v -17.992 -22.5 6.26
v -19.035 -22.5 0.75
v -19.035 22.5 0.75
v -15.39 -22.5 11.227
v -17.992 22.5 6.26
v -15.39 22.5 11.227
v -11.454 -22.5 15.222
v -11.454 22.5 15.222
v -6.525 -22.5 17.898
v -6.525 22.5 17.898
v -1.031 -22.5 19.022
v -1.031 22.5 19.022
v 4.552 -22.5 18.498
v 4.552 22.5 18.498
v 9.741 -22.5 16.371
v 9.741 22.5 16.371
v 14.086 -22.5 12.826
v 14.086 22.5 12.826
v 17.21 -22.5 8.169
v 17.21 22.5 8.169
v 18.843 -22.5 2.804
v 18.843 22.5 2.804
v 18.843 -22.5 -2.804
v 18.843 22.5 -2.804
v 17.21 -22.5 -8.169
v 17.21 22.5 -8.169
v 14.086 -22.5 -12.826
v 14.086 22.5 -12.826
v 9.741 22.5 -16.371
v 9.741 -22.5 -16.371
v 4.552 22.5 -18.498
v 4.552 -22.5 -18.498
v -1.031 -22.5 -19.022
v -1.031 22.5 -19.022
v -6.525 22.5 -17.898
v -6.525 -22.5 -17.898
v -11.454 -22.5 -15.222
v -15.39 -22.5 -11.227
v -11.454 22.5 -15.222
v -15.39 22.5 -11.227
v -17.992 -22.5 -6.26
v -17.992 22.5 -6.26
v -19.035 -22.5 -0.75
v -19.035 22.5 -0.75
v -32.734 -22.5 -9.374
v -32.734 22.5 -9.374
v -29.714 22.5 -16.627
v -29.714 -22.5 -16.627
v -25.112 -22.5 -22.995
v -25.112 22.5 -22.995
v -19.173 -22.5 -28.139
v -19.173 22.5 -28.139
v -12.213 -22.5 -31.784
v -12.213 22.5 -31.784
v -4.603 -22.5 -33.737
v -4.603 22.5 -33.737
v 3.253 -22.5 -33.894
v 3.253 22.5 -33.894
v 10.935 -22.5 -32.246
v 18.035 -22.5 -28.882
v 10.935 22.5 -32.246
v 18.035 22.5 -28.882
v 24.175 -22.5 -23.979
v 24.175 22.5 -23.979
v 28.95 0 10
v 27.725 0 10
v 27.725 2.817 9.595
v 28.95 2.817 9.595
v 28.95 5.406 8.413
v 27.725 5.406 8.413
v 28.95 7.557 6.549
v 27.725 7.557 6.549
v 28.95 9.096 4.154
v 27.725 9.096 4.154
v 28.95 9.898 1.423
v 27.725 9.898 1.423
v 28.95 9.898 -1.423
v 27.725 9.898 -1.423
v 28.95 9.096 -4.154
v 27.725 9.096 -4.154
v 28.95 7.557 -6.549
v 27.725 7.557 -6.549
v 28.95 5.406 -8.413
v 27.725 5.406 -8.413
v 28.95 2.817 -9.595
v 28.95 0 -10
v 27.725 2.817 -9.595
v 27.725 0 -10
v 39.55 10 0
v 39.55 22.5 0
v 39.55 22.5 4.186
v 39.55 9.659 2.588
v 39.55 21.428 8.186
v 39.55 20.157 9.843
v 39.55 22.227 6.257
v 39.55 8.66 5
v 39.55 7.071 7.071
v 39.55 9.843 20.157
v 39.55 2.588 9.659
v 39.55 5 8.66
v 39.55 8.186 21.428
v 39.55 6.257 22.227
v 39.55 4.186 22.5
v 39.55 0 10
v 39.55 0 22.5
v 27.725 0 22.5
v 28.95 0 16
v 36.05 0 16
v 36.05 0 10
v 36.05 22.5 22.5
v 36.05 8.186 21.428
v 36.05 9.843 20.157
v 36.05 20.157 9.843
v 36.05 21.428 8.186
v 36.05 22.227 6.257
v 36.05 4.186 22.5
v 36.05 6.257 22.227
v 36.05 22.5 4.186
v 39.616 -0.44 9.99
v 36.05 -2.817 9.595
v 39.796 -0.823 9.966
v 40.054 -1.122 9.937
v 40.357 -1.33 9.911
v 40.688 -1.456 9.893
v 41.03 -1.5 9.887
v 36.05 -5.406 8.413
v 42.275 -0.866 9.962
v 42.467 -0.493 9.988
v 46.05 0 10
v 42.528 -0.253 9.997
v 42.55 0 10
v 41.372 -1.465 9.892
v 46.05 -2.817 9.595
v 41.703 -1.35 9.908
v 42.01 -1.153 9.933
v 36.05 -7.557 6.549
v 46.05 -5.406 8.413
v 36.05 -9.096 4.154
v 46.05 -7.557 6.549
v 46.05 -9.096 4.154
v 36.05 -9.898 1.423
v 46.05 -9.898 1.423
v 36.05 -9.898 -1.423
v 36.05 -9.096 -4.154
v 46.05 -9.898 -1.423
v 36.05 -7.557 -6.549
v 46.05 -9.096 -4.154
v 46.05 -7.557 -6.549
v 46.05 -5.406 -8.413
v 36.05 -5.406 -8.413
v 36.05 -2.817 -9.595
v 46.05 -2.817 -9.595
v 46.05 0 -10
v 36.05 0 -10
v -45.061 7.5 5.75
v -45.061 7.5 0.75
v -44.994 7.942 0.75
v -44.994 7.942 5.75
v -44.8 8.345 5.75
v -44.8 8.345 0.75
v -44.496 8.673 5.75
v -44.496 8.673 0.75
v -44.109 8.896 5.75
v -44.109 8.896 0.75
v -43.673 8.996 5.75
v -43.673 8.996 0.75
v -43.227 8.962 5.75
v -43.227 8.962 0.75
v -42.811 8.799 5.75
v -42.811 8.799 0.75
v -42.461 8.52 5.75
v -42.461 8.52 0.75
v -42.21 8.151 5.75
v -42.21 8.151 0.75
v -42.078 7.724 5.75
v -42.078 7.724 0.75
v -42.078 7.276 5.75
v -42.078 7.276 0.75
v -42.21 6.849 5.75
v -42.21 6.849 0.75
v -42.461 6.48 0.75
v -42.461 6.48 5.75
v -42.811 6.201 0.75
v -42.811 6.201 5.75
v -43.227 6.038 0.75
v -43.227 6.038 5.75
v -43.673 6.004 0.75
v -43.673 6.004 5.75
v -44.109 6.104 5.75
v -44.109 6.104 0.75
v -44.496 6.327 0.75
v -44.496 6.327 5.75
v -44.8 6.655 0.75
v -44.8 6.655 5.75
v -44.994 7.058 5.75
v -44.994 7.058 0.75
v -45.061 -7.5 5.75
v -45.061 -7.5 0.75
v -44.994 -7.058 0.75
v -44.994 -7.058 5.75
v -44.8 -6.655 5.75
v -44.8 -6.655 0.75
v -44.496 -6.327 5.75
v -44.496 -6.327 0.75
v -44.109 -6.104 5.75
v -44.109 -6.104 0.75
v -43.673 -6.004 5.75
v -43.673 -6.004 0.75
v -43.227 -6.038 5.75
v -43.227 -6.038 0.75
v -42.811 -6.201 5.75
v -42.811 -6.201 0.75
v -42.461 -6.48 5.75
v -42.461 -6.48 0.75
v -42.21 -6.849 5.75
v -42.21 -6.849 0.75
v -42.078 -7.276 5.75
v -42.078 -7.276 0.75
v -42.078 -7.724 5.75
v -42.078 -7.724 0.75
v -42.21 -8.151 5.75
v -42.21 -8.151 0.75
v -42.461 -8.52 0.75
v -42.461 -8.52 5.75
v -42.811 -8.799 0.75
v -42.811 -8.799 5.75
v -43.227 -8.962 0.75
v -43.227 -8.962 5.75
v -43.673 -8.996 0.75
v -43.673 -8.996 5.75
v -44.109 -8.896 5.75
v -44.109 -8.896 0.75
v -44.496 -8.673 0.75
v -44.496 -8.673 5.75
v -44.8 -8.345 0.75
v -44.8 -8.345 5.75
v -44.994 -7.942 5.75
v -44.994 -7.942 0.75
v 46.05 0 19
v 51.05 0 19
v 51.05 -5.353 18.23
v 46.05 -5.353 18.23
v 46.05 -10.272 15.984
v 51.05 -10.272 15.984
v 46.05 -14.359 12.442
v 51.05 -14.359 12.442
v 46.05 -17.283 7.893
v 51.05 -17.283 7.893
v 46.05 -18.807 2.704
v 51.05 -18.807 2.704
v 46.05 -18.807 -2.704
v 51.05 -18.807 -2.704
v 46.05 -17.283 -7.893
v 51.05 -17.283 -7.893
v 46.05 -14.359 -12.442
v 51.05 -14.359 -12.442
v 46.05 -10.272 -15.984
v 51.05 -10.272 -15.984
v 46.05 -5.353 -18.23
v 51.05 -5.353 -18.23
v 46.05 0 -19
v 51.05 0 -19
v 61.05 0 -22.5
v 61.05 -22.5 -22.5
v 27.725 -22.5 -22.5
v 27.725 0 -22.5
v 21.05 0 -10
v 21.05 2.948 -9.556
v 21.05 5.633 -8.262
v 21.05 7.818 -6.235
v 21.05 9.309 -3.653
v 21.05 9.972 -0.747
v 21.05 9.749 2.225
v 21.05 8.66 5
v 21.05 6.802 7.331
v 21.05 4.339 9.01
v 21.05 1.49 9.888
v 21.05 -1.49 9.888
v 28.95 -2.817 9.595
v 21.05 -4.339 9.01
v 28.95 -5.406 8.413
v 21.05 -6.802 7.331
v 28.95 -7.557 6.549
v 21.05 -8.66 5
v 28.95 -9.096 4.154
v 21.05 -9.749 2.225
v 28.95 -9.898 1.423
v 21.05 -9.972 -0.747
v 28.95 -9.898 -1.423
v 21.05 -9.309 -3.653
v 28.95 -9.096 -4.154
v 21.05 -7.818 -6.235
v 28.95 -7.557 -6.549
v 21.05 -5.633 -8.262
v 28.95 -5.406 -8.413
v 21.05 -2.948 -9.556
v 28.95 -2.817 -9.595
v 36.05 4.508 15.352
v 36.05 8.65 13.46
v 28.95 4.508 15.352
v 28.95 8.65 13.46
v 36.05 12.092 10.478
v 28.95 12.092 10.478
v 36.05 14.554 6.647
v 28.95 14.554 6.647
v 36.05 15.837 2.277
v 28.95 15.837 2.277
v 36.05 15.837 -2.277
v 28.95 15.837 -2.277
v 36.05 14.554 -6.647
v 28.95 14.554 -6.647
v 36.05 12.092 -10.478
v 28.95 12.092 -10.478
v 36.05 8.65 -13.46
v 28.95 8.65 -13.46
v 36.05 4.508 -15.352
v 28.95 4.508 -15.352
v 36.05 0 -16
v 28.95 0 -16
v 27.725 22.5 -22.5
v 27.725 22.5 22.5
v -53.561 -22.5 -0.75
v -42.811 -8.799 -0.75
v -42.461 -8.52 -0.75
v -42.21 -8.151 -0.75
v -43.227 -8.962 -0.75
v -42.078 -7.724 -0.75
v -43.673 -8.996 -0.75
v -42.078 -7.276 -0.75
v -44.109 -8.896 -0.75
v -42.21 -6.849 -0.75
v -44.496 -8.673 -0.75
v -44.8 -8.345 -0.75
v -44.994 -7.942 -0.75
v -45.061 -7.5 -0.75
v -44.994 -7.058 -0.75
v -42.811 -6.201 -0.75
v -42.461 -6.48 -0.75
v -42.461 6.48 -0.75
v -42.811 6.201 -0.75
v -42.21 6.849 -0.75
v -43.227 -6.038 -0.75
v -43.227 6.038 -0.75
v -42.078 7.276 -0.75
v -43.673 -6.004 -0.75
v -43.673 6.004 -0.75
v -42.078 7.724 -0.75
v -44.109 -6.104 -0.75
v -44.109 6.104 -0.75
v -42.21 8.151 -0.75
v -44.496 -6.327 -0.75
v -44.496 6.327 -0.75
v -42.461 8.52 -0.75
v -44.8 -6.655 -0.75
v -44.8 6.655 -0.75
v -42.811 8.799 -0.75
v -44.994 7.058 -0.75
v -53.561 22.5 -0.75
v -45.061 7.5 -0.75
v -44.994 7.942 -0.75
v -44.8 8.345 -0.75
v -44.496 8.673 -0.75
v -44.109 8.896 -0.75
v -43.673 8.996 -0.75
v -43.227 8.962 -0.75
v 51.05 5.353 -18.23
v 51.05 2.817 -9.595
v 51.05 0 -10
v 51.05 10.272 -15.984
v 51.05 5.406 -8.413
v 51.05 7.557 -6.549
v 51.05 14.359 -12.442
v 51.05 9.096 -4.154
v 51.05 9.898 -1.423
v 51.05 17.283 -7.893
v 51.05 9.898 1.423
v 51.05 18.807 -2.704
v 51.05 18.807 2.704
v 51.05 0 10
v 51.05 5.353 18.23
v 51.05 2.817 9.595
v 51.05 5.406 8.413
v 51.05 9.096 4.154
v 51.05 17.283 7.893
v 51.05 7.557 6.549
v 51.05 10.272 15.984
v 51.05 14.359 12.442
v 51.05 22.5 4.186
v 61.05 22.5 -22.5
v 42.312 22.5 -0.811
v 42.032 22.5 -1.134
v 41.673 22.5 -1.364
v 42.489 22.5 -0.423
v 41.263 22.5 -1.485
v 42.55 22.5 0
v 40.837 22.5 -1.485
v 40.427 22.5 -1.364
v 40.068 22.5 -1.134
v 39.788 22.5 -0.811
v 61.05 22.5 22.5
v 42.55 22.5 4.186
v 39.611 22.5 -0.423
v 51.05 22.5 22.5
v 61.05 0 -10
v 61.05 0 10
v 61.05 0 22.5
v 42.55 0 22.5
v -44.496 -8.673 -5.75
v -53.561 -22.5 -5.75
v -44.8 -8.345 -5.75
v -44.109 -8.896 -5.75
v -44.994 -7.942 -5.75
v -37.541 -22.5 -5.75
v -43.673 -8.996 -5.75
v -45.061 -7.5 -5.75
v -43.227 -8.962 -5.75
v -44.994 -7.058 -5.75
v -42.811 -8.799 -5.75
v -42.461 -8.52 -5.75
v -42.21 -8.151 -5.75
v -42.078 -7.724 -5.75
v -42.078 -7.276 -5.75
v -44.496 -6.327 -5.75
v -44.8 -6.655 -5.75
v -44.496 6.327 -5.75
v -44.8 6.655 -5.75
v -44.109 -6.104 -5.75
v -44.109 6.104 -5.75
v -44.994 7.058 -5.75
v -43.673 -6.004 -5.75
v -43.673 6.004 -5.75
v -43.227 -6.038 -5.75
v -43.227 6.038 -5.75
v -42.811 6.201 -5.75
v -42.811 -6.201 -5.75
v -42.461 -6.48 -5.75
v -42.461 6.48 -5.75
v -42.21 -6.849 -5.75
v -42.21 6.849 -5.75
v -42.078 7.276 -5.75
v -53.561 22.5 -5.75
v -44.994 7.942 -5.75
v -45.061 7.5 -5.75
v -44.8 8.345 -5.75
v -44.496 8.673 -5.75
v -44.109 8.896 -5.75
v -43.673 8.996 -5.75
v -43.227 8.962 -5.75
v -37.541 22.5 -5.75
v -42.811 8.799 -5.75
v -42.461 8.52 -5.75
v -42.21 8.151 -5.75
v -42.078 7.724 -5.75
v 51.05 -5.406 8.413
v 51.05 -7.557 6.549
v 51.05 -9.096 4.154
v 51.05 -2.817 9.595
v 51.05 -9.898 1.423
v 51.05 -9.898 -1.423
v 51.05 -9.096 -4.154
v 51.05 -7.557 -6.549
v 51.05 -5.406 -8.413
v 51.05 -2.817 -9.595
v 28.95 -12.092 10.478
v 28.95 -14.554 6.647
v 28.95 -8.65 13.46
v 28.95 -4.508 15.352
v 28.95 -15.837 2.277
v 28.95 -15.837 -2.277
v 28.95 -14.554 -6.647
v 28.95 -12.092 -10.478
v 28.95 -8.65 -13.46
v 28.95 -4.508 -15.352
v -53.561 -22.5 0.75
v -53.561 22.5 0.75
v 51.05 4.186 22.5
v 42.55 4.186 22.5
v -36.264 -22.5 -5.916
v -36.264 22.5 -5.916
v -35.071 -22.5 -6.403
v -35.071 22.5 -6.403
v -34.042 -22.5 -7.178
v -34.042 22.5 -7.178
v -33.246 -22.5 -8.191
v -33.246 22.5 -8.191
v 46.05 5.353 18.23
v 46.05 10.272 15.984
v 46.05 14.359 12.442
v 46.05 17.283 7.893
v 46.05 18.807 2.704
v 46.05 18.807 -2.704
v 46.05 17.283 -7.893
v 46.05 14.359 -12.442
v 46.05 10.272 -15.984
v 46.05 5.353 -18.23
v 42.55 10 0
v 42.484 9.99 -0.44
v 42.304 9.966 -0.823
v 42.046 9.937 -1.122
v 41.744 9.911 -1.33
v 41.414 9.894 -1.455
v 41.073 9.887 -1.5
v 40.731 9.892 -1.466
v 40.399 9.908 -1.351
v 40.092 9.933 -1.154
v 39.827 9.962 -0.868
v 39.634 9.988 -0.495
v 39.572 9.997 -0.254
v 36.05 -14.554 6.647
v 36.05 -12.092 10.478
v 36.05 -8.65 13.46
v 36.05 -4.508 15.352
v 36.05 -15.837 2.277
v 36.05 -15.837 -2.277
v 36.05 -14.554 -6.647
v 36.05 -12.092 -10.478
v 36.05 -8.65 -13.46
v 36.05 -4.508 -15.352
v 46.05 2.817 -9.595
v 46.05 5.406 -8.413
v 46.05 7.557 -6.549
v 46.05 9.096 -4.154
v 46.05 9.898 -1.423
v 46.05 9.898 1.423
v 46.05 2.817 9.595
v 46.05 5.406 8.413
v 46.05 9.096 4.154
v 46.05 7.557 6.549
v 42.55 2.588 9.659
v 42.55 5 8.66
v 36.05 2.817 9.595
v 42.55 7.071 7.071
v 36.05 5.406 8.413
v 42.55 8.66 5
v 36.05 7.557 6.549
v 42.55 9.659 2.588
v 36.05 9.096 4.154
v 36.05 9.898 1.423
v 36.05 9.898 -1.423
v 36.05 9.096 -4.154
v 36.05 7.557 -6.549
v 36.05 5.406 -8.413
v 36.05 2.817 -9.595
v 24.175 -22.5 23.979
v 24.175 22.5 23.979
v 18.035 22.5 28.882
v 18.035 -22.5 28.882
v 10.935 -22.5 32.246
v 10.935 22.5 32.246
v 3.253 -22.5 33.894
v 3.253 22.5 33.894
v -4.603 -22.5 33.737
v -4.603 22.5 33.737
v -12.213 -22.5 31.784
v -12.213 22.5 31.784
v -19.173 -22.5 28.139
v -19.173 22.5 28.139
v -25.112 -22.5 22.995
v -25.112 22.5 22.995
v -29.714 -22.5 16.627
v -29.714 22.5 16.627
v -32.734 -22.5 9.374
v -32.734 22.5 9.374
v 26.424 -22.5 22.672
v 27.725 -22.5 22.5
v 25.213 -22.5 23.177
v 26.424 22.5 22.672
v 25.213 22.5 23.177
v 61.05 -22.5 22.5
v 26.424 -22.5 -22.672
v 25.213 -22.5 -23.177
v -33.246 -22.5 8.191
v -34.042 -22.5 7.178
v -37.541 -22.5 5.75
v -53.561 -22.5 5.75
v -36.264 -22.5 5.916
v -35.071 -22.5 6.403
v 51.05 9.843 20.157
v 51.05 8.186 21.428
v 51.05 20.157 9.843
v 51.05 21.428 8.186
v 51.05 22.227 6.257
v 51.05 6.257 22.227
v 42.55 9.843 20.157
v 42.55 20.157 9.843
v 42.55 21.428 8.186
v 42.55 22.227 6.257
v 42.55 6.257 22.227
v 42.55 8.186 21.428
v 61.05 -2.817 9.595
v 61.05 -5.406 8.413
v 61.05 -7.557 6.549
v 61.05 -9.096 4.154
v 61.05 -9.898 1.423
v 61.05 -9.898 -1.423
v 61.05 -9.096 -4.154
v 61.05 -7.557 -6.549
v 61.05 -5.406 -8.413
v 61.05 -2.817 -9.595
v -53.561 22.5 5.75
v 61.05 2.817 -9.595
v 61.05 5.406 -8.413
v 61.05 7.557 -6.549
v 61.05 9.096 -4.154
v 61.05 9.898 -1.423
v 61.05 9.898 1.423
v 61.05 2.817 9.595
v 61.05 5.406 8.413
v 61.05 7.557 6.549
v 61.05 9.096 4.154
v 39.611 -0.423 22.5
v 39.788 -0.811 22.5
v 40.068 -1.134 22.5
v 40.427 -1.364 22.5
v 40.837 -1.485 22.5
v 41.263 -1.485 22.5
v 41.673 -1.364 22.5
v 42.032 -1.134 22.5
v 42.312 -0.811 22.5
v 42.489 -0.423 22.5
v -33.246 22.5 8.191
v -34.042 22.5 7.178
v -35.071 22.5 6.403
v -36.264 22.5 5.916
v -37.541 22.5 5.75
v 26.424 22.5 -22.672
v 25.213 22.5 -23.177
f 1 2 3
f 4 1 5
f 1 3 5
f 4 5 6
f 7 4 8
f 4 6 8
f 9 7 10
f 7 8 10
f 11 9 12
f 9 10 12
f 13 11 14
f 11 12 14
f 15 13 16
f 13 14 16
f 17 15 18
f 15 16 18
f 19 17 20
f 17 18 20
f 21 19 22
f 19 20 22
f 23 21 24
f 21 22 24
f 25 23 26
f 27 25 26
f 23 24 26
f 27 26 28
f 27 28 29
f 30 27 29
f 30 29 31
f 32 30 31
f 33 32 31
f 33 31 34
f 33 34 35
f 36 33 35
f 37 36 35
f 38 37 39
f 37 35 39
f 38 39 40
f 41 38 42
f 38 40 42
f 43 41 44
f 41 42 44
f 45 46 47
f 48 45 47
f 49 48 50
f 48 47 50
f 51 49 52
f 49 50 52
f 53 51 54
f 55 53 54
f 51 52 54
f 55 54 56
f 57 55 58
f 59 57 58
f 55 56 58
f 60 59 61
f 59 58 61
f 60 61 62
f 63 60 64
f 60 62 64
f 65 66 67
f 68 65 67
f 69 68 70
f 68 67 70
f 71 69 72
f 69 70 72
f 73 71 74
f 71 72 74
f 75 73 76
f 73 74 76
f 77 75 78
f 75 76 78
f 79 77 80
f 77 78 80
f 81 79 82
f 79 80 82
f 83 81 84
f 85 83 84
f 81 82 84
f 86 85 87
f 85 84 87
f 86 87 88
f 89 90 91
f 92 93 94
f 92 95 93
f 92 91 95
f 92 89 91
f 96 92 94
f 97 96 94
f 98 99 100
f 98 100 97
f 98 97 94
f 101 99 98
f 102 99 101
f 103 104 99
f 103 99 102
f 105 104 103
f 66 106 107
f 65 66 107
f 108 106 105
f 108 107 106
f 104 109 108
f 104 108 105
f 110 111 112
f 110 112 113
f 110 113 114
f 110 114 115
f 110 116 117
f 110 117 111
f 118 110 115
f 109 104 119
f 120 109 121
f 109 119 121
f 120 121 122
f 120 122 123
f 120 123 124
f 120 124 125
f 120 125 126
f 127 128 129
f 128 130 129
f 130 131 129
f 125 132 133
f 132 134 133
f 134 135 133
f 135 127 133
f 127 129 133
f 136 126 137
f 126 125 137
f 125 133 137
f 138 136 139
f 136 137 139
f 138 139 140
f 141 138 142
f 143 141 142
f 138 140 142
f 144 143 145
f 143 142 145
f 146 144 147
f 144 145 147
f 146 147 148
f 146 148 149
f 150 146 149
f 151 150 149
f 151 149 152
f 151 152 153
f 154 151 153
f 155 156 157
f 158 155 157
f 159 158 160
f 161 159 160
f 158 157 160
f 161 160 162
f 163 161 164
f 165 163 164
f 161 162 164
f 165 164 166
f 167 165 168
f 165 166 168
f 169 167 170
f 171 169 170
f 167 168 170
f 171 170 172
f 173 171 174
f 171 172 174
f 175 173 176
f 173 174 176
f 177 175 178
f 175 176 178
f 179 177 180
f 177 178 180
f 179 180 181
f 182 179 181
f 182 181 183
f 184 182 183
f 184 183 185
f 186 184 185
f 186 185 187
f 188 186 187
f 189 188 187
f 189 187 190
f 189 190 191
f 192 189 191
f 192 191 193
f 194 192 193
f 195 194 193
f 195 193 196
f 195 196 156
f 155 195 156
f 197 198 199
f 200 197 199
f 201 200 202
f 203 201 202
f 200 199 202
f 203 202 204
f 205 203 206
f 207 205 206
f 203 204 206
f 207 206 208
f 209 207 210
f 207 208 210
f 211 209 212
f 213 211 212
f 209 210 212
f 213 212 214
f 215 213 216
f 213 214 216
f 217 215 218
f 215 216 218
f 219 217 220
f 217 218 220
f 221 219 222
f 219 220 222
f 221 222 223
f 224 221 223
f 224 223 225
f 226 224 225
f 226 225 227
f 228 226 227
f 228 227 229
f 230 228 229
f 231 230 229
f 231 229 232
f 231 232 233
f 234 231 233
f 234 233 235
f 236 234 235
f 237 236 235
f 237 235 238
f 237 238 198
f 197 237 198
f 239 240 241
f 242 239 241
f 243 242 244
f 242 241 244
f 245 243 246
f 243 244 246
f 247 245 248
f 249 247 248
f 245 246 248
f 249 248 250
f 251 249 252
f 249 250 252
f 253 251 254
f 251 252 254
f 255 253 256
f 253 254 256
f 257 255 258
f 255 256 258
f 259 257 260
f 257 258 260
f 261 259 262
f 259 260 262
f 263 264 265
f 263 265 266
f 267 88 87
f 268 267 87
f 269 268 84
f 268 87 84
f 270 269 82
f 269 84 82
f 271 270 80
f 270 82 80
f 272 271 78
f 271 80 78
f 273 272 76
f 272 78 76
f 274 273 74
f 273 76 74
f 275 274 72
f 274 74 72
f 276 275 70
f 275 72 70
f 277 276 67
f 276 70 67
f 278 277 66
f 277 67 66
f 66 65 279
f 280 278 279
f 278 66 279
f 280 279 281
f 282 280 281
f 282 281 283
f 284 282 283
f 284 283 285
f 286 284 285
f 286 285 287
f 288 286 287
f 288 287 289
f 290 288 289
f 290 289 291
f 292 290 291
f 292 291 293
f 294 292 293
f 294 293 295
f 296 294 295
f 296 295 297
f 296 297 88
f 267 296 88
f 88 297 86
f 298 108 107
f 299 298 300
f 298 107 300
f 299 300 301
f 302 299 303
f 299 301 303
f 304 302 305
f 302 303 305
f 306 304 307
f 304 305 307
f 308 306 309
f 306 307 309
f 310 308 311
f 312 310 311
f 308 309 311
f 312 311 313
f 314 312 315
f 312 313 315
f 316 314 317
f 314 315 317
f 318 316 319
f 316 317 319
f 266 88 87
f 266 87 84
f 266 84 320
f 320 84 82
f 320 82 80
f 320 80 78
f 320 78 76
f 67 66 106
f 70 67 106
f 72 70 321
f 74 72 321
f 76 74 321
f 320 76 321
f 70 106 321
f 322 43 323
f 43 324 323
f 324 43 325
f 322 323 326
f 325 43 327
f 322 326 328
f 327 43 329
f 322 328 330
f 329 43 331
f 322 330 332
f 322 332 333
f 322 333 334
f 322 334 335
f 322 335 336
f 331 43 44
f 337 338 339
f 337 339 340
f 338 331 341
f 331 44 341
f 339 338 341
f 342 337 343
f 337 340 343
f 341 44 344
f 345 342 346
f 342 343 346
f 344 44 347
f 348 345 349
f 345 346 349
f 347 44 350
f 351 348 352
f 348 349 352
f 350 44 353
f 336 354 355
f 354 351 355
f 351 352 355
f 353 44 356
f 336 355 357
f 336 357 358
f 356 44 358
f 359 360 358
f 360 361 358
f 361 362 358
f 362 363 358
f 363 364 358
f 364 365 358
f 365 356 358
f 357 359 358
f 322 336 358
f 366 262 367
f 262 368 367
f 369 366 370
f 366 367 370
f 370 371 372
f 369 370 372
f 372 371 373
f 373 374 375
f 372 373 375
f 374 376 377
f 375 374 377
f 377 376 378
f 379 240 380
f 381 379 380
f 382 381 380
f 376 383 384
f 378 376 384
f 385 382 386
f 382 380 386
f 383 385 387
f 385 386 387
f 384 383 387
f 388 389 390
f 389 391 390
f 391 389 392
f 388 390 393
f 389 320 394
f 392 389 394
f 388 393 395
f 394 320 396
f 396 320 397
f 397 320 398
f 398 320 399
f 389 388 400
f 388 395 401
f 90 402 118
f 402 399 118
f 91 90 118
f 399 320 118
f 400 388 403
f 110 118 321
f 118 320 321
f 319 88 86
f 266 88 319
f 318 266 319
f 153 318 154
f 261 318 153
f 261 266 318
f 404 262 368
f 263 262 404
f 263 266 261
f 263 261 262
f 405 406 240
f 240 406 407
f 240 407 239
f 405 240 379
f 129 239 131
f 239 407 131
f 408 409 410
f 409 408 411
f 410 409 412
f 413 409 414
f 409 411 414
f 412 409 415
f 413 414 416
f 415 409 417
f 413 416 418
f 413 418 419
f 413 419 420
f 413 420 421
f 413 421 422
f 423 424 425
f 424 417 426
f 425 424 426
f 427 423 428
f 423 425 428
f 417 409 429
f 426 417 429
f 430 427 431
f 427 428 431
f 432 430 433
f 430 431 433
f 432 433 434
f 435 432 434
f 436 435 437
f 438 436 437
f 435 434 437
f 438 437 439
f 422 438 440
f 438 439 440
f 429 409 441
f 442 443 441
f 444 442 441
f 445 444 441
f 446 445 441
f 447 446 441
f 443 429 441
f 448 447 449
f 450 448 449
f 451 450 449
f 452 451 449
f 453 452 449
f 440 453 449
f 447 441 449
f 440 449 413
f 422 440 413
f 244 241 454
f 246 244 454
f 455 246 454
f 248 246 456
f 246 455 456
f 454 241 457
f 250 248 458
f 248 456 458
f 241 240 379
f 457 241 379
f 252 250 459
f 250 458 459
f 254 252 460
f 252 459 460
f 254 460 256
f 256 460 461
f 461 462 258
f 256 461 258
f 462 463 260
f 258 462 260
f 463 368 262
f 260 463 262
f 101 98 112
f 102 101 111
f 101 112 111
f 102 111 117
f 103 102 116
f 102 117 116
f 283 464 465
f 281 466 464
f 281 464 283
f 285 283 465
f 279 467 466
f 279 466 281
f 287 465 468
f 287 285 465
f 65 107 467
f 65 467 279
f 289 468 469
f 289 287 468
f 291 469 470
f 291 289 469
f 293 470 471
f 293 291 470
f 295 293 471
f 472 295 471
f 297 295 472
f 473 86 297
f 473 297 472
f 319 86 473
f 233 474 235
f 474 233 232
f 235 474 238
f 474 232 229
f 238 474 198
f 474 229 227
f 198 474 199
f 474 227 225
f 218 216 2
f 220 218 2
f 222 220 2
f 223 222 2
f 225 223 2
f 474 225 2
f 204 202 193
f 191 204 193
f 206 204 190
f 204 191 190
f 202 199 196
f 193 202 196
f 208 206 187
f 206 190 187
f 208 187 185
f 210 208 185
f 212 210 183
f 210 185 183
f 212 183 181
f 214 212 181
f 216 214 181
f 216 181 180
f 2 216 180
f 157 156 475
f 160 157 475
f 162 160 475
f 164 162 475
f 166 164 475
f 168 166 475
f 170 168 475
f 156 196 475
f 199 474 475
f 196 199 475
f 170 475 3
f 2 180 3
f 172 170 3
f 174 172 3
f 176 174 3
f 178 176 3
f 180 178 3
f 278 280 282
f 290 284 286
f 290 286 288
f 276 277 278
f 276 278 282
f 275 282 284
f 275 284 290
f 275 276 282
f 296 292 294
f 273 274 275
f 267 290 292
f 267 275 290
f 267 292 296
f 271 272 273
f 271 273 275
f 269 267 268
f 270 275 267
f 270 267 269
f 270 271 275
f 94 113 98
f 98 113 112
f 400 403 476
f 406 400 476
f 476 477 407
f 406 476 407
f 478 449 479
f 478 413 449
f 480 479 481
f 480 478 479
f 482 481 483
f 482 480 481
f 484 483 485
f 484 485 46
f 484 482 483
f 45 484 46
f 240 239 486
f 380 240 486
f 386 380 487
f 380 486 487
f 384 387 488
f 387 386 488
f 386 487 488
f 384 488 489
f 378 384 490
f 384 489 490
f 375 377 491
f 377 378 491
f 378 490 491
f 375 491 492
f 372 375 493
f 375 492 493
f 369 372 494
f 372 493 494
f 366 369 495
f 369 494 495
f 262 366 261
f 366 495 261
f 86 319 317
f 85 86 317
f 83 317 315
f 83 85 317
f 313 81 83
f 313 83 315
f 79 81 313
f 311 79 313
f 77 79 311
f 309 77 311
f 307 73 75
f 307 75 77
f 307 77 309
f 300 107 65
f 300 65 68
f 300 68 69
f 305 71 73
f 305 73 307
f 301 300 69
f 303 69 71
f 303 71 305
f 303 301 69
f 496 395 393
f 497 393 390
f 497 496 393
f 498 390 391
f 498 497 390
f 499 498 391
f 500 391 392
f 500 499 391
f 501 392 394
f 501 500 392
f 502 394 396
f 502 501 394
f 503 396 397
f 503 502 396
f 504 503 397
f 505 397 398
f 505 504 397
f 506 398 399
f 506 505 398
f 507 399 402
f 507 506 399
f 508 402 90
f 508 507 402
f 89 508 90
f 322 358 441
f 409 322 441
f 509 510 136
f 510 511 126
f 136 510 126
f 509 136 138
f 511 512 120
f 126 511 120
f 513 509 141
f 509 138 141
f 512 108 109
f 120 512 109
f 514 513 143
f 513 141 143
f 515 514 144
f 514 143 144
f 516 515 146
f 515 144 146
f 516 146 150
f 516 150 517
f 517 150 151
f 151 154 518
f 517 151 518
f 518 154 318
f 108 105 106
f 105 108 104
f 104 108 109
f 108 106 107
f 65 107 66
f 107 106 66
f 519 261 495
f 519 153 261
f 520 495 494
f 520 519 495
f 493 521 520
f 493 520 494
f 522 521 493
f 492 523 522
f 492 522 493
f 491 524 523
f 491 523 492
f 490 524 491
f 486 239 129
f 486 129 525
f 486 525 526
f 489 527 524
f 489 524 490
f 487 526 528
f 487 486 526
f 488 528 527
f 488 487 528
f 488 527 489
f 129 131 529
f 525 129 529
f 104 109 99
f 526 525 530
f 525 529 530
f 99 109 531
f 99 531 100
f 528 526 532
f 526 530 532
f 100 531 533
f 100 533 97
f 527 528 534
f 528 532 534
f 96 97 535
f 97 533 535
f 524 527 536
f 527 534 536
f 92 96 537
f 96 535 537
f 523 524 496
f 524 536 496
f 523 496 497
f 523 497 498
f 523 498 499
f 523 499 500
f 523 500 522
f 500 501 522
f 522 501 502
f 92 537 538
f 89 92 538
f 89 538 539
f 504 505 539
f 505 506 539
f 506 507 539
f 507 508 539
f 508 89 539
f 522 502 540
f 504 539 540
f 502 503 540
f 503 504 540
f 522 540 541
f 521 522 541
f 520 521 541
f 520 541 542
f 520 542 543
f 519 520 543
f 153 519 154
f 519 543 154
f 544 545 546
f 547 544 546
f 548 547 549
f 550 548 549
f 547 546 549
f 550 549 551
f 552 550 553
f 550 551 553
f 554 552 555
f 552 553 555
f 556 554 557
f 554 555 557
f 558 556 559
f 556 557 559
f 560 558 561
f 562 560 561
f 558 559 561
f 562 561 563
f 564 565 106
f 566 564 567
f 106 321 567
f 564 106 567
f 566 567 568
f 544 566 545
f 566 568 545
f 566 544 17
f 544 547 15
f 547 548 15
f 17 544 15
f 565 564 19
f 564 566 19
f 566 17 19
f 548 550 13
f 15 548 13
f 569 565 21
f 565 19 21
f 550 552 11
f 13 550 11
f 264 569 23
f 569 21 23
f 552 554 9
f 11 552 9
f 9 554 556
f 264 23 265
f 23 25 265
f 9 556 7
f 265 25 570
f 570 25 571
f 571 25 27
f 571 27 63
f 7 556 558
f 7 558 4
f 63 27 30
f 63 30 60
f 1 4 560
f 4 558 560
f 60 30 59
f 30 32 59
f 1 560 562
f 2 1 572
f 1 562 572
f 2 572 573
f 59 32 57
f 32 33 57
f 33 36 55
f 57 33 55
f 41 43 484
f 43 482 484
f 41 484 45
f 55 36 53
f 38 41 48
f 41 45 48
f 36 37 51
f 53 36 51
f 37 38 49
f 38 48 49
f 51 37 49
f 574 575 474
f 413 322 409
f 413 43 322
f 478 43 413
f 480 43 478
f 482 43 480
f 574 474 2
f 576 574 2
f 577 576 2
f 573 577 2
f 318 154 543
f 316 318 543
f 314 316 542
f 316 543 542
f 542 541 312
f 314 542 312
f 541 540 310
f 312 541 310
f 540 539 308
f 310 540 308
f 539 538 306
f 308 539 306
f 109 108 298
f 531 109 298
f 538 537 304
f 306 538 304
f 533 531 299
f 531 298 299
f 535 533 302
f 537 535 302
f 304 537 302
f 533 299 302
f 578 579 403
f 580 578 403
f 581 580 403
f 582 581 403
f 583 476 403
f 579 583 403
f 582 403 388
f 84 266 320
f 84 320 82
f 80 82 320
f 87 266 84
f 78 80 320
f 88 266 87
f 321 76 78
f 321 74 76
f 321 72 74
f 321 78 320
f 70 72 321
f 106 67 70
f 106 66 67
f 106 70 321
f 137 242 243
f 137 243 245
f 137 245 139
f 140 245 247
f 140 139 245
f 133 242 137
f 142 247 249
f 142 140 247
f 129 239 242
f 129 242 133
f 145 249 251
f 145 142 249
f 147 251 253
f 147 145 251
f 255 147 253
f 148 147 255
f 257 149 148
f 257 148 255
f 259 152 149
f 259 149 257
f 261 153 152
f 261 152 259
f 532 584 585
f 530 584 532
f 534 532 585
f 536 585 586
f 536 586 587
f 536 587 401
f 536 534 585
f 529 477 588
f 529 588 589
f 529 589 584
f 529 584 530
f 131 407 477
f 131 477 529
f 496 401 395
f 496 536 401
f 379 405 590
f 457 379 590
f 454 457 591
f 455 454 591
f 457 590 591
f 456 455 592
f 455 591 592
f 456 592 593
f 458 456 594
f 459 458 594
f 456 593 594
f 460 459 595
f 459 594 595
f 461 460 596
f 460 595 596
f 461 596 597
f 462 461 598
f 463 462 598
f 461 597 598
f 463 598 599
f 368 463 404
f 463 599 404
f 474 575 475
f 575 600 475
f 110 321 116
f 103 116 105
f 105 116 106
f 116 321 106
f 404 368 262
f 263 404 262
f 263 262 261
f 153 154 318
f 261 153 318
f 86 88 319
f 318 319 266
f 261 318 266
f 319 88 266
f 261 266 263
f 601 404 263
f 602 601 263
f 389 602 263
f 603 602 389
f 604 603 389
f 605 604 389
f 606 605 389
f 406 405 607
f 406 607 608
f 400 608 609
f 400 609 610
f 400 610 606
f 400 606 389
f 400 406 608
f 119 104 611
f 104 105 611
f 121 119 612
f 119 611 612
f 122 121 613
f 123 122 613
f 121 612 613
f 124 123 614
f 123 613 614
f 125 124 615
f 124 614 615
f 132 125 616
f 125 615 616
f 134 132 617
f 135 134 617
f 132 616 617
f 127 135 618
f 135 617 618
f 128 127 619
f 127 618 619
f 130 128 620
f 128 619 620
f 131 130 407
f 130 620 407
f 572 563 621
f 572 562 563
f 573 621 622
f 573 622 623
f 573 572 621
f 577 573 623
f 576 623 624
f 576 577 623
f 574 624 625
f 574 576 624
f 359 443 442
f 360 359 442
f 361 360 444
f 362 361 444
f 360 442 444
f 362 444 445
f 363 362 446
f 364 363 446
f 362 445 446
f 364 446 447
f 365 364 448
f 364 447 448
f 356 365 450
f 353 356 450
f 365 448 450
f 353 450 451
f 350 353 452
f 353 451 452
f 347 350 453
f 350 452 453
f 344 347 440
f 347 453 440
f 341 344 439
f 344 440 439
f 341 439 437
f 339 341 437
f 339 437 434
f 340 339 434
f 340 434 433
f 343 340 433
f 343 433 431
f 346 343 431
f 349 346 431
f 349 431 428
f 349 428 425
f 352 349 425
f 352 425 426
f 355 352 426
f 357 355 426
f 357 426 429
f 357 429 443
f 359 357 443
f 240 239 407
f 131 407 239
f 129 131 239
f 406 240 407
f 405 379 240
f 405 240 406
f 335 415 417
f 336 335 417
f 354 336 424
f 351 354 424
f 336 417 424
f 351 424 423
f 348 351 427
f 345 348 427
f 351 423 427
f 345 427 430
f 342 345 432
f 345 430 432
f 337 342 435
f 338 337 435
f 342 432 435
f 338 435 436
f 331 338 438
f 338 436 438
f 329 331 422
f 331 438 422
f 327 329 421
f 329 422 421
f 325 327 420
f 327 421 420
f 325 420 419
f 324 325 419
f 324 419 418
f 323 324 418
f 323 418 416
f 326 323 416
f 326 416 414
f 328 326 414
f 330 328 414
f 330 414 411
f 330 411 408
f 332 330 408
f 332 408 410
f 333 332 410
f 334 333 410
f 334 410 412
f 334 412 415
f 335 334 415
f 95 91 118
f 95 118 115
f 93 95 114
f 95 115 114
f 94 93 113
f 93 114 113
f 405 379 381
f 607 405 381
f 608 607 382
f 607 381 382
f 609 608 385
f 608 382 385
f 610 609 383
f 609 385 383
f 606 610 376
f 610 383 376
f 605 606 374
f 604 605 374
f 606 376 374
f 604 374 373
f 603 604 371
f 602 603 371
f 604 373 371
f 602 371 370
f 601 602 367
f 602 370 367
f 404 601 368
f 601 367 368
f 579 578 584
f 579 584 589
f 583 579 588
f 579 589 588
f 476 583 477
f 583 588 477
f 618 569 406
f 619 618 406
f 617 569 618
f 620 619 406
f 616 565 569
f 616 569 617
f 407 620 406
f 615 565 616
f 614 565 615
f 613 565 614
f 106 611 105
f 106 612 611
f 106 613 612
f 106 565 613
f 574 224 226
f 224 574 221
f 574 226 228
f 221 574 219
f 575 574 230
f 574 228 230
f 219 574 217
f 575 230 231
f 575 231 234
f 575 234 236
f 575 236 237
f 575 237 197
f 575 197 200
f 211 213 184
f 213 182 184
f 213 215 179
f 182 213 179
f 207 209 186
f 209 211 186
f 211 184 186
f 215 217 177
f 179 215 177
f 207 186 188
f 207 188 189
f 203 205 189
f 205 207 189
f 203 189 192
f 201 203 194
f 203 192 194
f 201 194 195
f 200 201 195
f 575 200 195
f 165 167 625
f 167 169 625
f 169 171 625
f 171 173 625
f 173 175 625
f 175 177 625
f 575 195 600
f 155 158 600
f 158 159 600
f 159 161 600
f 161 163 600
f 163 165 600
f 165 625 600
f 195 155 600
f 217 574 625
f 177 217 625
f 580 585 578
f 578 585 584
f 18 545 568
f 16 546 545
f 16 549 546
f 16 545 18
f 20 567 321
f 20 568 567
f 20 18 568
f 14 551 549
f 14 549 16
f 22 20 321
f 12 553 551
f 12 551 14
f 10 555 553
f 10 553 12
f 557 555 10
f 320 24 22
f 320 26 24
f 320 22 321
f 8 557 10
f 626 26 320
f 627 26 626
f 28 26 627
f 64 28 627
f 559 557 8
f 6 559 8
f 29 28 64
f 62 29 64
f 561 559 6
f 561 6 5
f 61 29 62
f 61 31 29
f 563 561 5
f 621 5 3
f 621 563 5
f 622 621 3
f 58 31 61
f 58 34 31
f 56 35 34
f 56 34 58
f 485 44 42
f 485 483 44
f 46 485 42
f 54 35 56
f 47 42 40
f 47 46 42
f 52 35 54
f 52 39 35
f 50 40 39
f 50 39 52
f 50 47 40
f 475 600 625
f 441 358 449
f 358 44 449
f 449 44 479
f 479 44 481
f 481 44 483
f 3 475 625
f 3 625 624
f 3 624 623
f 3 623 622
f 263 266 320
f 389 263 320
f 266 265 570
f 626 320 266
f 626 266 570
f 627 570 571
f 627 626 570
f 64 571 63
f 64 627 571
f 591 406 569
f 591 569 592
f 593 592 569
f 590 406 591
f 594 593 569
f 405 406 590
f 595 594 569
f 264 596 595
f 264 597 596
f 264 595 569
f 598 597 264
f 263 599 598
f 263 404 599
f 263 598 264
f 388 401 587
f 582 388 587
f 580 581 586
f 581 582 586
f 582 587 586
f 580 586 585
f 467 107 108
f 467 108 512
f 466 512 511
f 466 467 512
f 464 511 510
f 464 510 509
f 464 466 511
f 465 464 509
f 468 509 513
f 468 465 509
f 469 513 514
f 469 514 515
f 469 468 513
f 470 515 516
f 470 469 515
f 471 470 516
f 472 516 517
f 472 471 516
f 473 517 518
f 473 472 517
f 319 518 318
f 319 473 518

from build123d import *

# Parameters (mm, degrees)
BOSS_EXTRUDE1_DEPTH     = 22.5
F_3_0MM_DOWEL_HOLE1_D   = 3
BOSS_EXTRUDE2_START     = -8.493151603
BOSS_EXTRUDE2_OUTLINE_W = 45
BOSS_EXTRUDE2_OUTLINE_H = 45
BOSS_EXTRUDE2_DEPTH     = 35.493151603
SKETCH5_R               = 10
CUT_EXTRUDE1_DEPTH      = 40
CUT_EXTRUDE9_START      = -10
SKETCH16_R              = 19
CUT_EXTRUDE9_DEPTH      = 5
CUT_EXTRUDE2_START      = 22.5
SKETCH7_W               = 7.1
SKETCH7_H               = 45
CUT_EXTRUDE2_DEPTH      = 40
SKETCH8_W               = 22.5
SKETCH8_H               = 22.5
CUT_EXTRUDE3_DEPTH      = 1.5
CUT_EXTRUDE5_OUTLINE_W  = 1.5
CUT_EXTRUDE5_OUTLINE_H  = 12.613186919
CUT_EXTRUDE8_START      = 9
CUT_EXTRUDE8_DEPTH      = 14
CHAMFER1_START          = 36.05
CHAMFER1_DEPTH          = 15
FILLET3_R               = 5
FILLET4_R               = 8
SKETCH23_W              = 45
SKETCH23_H              = 40
SKETCH23_R              = 16
BOSS_EXTRUDE5_DEPTH     = 7.1
SPLIT1_START            = 27.724582954
SPLIT1_DEPTH            = 33.325417046
SPLIT1_START_2          = 51.05
SPLIT1_2_DEPTH          = 10
SPLIT1_START_3          = 36.05
SPLIT1_3_DEPTH          = 10
SPLIT1_4_DEPTH          = 8.325417046
SPLIT1_5_DEPTH          = 1.225417046
SPLIT1_START_4          = -1
SPLIT1_6_DEPTH          = 24
SPLIT1_7_DEPTH          = 22.5


with BuildPart() as part:
    # Sketch3 → Boss-Extrude1 (new, symmetric)
    with BuildSketch(Plane(origin=(0, 0, 0), x_dir=(1, 0, 0), z_dir=(0, 1, 0))):
        with BuildLine():
            Line((-53.560989258, 0.75), (-53.560989258, 5.75))
            Line((-53.560989258, 5.75), (-33.560989258, 5.75))
            ThreePointArc((-33.560989258, 5.75), (34.05, 0), (-33.560989258, -5.75))
            Line((-33.560989258, -5.75), (-53.560989258, -5.75))
            Line((-53.560989258, -5.75), (-53.560989258, -0.75))
            Line((-53.560989258, -0.75), (-19.035230495, -0.75))
            ThreePointArc((-19.035230495, -0.75), (19.05, 0), (-19.035230495, 0.75))
            Line((-19.035230495, 0.75), (-53.560989258, 0.75))
        make_face()
    extrude(amount=BOSS_EXTRUDE1_DEPTH, both=True)

    # Ø3.0mm Dowel Hole1 (through all)
    with Locations(Plane.XY.offset(5.75)):
        with Locations((-43.560989258, 7.5), (-43.560989258, -7.5)):
            Hole(F_3_0MM_DOWEL_HOLE1_D / 2)

    # Boss-Extrude2: read off the stored shape, not the designer's step
    # Boss-Extrude2 outline → Boss-Extrude2 (add)
    with BuildSketch(Plane(origin=(34.05, 0, 0), x_dir=(0, 0, -1), z_dir=(1, 0, 0)).offset(BOSS_EXTRUDE2_START)):
        Rectangle(BOSS_EXTRUDE2_OUTLINE_W, BOSS_EXTRUDE2_OUTLINE_H)
    extrude(amount=BOSS_EXTRUDE2_DEPTH)

    # Sketch5 → Cut-Extrude1 (cut)
    with BuildSketch(Plane(origin=(61.05, 0, 0), x_dir=(0, 0, -1), z_dir=(1, 0, 0))):
        Circle(SKETCH5_R)
    extrude(amount=-CUT_EXTRUDE1_DEPTH, mode=Mode.SUBTRACT)

    # Sketch16 → Cut-Extrude9 (cut)
    with BuildSketch(Plane(origin=(61.05, 0, 0), x_dir=(0, 0, -1), z_dir=(1, 0, 0)).offset(CUT_EXTRUDE9_START)):
        Circle(SKETCH16_R)
    extrude(amount=-CUT_EXTRUDE9_DEPTH, mode=Mode.SUBTRACT)

    # Sketch7 → Cut-Extrude2 (cut)
    with BuildSketch(Plane(origin=(0, 0, 0), x_dir=(1, 0, 0), z_dir=(0, 1, 0)).offset(CUT_EXTRUDE2_START)):
        with Locations((32.5, 0)):
            Rectangle(SKETCH7_W, SKETCH7_H)
    extrude(amount=-CUT_EXTRUDE2_DEPTH, mode=Mode.SUBTRACT)

    # Sketch8 → Cut-Extrude3 (cut, symmetric)
    with BuildSketch(Plane.ZY.offset(-41.05)):
        with Locations((11.25, 11.25)):
            Rectangle(SKETCH8_W, SKETCH8_H)
    extrude(amount=CUT_EXTRUDE3_DEPTH, both=True, mode=Mode.SUBTRACT)

    # Cut-Extrude5: read off the stored shape, not the designer's step
    # Cut-Extrude5 outline → Cut-Extrude5 (revolve, cut)
    with BuildSketch(Plane(origin=(41.05, 0, 0), x_dir=(1, 0, 0), z_dir=(0, -1, 0))):
        with Locations((0.75, 16.19340654)):
            Rectangle(CUT_EXTRUDE5_OUTLINE_W, CUT_EXTRUDE5_OUTLINE_H)
    revolve(axis=Axis((41.05, 0, 0), (0, 0, 1)), mode=Mode.SUBTRACT)

    # Cut-Extrude8: read off the stored shape, not the designer's step
    # Cut-Extrude8 outline → Cut-Extrude8 (cut)
    with BuildSketch(Plane(origin=(0, 0, 0), x_dir=(1, 0, 0), z_dir=(0, 1, 0)).offset(CUT_EXTRUDE8_START)):
        with BuildLine():
            ThreePointArc((42.55, 0), (41.05, 1.5), (39.55, 0))
            Line((39.55, 0), (42.55, 0))
        make_face()
    extrude(amount=CUT_EXTRUDE8_DEPTH, mode=Mode.SUBTRACT)

    # Chamfer1: read off the stored shape, not the designer's step
    # Chamfer1 outline → Chamfer1 (cut)
    with BuildSketch(Plane.YZ.offset(CHAMFER1_START)):
        Polygon((22.5, 22.5), (7.5, 22.5), (22.5, 7.5), align=None)
    extrude(amount=CHAMFER1_DEPTH, mode=Mode.SUBTRACT)

    # Fillet3
    fillet3_edges = [part.edges().sort_by_distance(p)[0] for p in [
        (-33.560989258, 0, -5.75),
        (-33.560989258, 0, 5.75),
        (25.556848397, 0, -22.5),
        (25.556848397, 0, 22.5),
    ]]
    fillet(fillet3_edges, radius=FILLET3_R)

    # Fillet4
    fillet4_edges = [part.edges().sort_by_distance(p)[0] for p in [
        (37.8, 22.5, 7.5),
        (46.8, 22.5, 7.5),
        (37.8, 7.5, 22.5),
        (46.8, 7.5, 22.5),
    ]]
    fillet(fillet4_edges, radius=FILLET4_R)

    # Sketch23 → Boss-Extrude5 (add)
    with BuildSketch(Plane(origin=(28.95, 0, 0), x_dir=(0, 0, -1), z_dir=(1, 0, 0))):
        with Locations((0, 2.5)):
            Rectangle(SKETCH23_W, SKETCH23_H)
        with Locations(Location((0, 0, 0), (0, 0, 180))):
            Circle(SKETCH23_R, mode=Mode.SUBTRACT)
    extrude(amount=BOSS_EXTRUDE5_DEPTH)

    # Split1 7 outline → Split1 7 (cut)
    with BuildSketch(Plane(origin=(0, 0, 0), x_dir=(1, 0, 0), z_dir=(0, 1, 0))):
        with BuildLine():
            Line((61.05, 22.5), (27.724582954, 22.5))
            Line((27.724582954, 22.5), (27.724582954, -22.5))
            Line((27.724582954, -22.5), (36.05, -22.5))
            Line((36.05, -22.5), (39.55, -22.5))
            Line((39.55, -22.5), (39.55, 0))
            ThreePointArc((39.55, 0), (41.05, 1.5), (42.55, 0))
            Line((42.55, 0), (42.55, -22.5))
            Line((42.55, -22.5), (51.05, -22.5))
            Line((51.05, -22.5), (61.05, -22.5))
            Line((61.05, -22.5), (61.05, 22.5))
        make_face()
    extrude(amount=SPLIT1_7_DEPTH, mode=Mode.SUBTRACT)


with BuildPart() as body_2:
    # Split1: read off the stored shape, not the designer's step
    # Split1 outline → Split1 (new body)
    with BuildSketch(Plane.YZ.offset(SPLIT1_START)):
        with BuildLine():
            Line((4.186291501, 22.5), (0, 22.5))
            Line((0, 22.5), (0, 19))
            ThreePointArc((0, 19), (19, 0), (0, -19))
            Line((0, -19), (0, -22.5))
            Line((0, -22.5), (22.5, -22.5))
            Line((22.5, -22.5), (22.5, 4.186291501))
            ThreePointArc((22.5, 4.186291501), (21.89103626, 7.24775896), (20.156854249, 9.843145751))
            Line((20.156854249, 9.843145751), (9.843145751, 20.156854249))
            ThreePointArc((9.843145751, 20.156854249), (7.24775896, 21.89103626), (4.186291501, 22.5))
        make_face()
    extrude(amount=SPLIT1_DEPTH)

    # Split1 2 outline → Split1 2 (add)
    with BuildSketch(Plane.YZ.offset(SPLIT1_START_2)):
        with BuildLine():
            ThreePointArc((0, -19), (19, 0), (0, 19))
            Line((0, 19), (0, 10))
            ThreePointArc((0, 10), (10, 0), (0, -10))
            Line((0, -10), (0, -19))
        make_face()
        with BuildLine():
            Line((22.5, 22.5), (4.186291501, 22.5))
            ThreePointArc((4.186291501, 22.5), (7.24775896, 21.89103626), (9.843145751, 20.156854249))
            Line((9.843145751, 20.156854249), (20.156854249, 9.843145751))
            ThreePointArc((20.156854249, 9.843145751), (21.89103626, 7.24775896), (22.5, 4.186291501))
            Line((22.5, 4.186291501), (22.5, 22.5))
        make_face()
    extrude(amount=SPLIT1_2_DEPTH)

    # Split1 3 outline → Split1 3 (add)
    with BuildSketch(Plane.YZ.offset(SPLIT1_START_3)):
        with BuildLine():
            ThreePointArc((0, -19), (19, 0), (0, 19))
            Line((0, 19), (0, 10))
            ThreePointArc((0, 10), (10, 0), (0, -10))
            Line((0, -10), (0, -19))
        make_face()
    extrude(amount=SPLIT1_3_DEPTH)

    # Split1 4 outline → Split1 4 (add)
    with BuildSketch(Plane.YZ.offset(SPLIT1_START)):
        with BuildLine():
            ThreePointArc((0, -19), (19, 0), (0, 19))
            Line((0, 19), (0, 16))
            ThreePointArc((0, 16), (16, 0), (0, -16))
            Line((0, -16), (0, -19))
        make_face()
        with BuildLine():
            Line((22.5, 22.5), (4.186291501, 22.5))
            ThreePointArc((4.186291501, 22.5), (7.24775896, 21.89103626), (9.843145751, 20.156854249))
            Line((9.843145751, 20.156854249), (20.156854249, 9.843145751))
            ThreePointArc((20.156854249, 9.843145751), (21.89103626, 7.24775896), (22.5, 4.186291501))
            Line((22.5, 4.186291501), (22.5, 22.5))
        make_face()
    extrude(amount=SPLIT1_4_DEPTH)

    # Split1 5 outline → Split1 5 (add)
    with BuildSketch(Plane.YZ.offset(SPLIT1_START)):
        with BuildLine():
            ThreePointArc((0, -16), (16, 0), (0, 16))
            Line((0, 16), (0, 10))
            ThreePointArc((0, 10), (10, 0), (0, -10))
            Line((0, -10), (0, -16))
        make_face()
    extrude(amount=SPLIT1_5_DEPTH)

    # Split1 6 outline → Split1 6 (cut)
    with BuildSketch(Plane(origin=(0, 0, 0), x_dir=(1, 0, 0), z_dir=(0, 1, 0)).offset(SPLIT1_START_4)):
        with BuildLine():
            Line((39.55, 0), (39.55, -22.5))
            Line((39.55, -22.5), (42.55, -22.5))
            Line((42.55, -22.5), (42.55, 0))
            ThreePointArc((42.55, 0), (41.05, 1.5), (39.55, 0))
        make_face()
    extrude(amount=SPLIT1_6_DEPTH, mode=Mode.SUBTRACT)


solid = Compound([part.part, body_2.part])
